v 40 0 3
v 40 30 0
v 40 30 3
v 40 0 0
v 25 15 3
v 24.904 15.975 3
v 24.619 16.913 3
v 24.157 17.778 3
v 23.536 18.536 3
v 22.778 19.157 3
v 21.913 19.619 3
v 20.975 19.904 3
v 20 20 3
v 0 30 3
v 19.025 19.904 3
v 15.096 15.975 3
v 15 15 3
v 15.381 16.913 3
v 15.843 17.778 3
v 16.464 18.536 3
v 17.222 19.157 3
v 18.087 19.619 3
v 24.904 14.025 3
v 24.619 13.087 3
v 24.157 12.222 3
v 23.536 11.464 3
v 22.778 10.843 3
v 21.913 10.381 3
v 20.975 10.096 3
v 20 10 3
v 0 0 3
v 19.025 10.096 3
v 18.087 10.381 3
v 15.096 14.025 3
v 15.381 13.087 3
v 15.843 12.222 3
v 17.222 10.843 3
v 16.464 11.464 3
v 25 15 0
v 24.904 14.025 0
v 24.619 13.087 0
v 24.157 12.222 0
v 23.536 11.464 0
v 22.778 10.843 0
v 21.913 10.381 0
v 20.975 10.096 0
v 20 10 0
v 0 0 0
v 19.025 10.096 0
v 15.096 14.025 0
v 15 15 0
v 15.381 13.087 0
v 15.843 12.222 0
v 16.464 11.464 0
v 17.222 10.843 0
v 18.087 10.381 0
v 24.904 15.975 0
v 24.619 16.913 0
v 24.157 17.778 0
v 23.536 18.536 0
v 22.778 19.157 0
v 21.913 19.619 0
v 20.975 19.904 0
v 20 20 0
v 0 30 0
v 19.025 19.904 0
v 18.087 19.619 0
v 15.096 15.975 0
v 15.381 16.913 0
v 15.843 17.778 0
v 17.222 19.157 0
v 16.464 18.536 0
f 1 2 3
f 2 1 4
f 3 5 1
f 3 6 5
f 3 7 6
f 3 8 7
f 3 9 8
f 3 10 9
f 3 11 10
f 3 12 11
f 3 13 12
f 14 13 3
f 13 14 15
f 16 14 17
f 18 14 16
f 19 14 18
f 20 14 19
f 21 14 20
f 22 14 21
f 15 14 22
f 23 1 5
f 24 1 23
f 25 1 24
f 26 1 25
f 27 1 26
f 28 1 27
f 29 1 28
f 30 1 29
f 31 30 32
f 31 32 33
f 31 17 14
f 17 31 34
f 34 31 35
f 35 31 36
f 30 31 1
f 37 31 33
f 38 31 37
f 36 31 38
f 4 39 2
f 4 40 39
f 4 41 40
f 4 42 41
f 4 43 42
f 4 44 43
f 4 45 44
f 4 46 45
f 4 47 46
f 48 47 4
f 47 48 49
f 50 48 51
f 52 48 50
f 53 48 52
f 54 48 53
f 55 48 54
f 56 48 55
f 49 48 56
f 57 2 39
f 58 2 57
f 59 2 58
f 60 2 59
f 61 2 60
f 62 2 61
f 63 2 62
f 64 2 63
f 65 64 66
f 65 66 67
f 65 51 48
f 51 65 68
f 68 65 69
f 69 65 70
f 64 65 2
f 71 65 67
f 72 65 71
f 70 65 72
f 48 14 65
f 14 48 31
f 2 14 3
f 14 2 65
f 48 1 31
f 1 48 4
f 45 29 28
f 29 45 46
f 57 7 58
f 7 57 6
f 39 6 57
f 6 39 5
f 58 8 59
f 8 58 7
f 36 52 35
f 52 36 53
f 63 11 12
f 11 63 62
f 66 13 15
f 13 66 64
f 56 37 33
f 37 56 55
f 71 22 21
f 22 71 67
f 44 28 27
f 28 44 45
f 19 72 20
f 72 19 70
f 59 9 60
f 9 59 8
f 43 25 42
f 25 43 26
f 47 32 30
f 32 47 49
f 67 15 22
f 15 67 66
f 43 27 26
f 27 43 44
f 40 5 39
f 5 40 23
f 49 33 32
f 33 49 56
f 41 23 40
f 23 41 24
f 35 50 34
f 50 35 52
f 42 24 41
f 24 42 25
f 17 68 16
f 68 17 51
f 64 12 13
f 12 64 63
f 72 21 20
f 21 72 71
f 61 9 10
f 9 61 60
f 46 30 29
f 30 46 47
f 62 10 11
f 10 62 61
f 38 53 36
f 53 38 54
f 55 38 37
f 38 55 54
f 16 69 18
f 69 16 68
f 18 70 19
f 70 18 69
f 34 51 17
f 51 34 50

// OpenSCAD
module camera_mount(){
  difference(){
    cube([40,30,3]);
    translate([20,15,-0.1]) cylinder(h=3.2,r=5,$fn=32);
  }
}
camera_mount();
